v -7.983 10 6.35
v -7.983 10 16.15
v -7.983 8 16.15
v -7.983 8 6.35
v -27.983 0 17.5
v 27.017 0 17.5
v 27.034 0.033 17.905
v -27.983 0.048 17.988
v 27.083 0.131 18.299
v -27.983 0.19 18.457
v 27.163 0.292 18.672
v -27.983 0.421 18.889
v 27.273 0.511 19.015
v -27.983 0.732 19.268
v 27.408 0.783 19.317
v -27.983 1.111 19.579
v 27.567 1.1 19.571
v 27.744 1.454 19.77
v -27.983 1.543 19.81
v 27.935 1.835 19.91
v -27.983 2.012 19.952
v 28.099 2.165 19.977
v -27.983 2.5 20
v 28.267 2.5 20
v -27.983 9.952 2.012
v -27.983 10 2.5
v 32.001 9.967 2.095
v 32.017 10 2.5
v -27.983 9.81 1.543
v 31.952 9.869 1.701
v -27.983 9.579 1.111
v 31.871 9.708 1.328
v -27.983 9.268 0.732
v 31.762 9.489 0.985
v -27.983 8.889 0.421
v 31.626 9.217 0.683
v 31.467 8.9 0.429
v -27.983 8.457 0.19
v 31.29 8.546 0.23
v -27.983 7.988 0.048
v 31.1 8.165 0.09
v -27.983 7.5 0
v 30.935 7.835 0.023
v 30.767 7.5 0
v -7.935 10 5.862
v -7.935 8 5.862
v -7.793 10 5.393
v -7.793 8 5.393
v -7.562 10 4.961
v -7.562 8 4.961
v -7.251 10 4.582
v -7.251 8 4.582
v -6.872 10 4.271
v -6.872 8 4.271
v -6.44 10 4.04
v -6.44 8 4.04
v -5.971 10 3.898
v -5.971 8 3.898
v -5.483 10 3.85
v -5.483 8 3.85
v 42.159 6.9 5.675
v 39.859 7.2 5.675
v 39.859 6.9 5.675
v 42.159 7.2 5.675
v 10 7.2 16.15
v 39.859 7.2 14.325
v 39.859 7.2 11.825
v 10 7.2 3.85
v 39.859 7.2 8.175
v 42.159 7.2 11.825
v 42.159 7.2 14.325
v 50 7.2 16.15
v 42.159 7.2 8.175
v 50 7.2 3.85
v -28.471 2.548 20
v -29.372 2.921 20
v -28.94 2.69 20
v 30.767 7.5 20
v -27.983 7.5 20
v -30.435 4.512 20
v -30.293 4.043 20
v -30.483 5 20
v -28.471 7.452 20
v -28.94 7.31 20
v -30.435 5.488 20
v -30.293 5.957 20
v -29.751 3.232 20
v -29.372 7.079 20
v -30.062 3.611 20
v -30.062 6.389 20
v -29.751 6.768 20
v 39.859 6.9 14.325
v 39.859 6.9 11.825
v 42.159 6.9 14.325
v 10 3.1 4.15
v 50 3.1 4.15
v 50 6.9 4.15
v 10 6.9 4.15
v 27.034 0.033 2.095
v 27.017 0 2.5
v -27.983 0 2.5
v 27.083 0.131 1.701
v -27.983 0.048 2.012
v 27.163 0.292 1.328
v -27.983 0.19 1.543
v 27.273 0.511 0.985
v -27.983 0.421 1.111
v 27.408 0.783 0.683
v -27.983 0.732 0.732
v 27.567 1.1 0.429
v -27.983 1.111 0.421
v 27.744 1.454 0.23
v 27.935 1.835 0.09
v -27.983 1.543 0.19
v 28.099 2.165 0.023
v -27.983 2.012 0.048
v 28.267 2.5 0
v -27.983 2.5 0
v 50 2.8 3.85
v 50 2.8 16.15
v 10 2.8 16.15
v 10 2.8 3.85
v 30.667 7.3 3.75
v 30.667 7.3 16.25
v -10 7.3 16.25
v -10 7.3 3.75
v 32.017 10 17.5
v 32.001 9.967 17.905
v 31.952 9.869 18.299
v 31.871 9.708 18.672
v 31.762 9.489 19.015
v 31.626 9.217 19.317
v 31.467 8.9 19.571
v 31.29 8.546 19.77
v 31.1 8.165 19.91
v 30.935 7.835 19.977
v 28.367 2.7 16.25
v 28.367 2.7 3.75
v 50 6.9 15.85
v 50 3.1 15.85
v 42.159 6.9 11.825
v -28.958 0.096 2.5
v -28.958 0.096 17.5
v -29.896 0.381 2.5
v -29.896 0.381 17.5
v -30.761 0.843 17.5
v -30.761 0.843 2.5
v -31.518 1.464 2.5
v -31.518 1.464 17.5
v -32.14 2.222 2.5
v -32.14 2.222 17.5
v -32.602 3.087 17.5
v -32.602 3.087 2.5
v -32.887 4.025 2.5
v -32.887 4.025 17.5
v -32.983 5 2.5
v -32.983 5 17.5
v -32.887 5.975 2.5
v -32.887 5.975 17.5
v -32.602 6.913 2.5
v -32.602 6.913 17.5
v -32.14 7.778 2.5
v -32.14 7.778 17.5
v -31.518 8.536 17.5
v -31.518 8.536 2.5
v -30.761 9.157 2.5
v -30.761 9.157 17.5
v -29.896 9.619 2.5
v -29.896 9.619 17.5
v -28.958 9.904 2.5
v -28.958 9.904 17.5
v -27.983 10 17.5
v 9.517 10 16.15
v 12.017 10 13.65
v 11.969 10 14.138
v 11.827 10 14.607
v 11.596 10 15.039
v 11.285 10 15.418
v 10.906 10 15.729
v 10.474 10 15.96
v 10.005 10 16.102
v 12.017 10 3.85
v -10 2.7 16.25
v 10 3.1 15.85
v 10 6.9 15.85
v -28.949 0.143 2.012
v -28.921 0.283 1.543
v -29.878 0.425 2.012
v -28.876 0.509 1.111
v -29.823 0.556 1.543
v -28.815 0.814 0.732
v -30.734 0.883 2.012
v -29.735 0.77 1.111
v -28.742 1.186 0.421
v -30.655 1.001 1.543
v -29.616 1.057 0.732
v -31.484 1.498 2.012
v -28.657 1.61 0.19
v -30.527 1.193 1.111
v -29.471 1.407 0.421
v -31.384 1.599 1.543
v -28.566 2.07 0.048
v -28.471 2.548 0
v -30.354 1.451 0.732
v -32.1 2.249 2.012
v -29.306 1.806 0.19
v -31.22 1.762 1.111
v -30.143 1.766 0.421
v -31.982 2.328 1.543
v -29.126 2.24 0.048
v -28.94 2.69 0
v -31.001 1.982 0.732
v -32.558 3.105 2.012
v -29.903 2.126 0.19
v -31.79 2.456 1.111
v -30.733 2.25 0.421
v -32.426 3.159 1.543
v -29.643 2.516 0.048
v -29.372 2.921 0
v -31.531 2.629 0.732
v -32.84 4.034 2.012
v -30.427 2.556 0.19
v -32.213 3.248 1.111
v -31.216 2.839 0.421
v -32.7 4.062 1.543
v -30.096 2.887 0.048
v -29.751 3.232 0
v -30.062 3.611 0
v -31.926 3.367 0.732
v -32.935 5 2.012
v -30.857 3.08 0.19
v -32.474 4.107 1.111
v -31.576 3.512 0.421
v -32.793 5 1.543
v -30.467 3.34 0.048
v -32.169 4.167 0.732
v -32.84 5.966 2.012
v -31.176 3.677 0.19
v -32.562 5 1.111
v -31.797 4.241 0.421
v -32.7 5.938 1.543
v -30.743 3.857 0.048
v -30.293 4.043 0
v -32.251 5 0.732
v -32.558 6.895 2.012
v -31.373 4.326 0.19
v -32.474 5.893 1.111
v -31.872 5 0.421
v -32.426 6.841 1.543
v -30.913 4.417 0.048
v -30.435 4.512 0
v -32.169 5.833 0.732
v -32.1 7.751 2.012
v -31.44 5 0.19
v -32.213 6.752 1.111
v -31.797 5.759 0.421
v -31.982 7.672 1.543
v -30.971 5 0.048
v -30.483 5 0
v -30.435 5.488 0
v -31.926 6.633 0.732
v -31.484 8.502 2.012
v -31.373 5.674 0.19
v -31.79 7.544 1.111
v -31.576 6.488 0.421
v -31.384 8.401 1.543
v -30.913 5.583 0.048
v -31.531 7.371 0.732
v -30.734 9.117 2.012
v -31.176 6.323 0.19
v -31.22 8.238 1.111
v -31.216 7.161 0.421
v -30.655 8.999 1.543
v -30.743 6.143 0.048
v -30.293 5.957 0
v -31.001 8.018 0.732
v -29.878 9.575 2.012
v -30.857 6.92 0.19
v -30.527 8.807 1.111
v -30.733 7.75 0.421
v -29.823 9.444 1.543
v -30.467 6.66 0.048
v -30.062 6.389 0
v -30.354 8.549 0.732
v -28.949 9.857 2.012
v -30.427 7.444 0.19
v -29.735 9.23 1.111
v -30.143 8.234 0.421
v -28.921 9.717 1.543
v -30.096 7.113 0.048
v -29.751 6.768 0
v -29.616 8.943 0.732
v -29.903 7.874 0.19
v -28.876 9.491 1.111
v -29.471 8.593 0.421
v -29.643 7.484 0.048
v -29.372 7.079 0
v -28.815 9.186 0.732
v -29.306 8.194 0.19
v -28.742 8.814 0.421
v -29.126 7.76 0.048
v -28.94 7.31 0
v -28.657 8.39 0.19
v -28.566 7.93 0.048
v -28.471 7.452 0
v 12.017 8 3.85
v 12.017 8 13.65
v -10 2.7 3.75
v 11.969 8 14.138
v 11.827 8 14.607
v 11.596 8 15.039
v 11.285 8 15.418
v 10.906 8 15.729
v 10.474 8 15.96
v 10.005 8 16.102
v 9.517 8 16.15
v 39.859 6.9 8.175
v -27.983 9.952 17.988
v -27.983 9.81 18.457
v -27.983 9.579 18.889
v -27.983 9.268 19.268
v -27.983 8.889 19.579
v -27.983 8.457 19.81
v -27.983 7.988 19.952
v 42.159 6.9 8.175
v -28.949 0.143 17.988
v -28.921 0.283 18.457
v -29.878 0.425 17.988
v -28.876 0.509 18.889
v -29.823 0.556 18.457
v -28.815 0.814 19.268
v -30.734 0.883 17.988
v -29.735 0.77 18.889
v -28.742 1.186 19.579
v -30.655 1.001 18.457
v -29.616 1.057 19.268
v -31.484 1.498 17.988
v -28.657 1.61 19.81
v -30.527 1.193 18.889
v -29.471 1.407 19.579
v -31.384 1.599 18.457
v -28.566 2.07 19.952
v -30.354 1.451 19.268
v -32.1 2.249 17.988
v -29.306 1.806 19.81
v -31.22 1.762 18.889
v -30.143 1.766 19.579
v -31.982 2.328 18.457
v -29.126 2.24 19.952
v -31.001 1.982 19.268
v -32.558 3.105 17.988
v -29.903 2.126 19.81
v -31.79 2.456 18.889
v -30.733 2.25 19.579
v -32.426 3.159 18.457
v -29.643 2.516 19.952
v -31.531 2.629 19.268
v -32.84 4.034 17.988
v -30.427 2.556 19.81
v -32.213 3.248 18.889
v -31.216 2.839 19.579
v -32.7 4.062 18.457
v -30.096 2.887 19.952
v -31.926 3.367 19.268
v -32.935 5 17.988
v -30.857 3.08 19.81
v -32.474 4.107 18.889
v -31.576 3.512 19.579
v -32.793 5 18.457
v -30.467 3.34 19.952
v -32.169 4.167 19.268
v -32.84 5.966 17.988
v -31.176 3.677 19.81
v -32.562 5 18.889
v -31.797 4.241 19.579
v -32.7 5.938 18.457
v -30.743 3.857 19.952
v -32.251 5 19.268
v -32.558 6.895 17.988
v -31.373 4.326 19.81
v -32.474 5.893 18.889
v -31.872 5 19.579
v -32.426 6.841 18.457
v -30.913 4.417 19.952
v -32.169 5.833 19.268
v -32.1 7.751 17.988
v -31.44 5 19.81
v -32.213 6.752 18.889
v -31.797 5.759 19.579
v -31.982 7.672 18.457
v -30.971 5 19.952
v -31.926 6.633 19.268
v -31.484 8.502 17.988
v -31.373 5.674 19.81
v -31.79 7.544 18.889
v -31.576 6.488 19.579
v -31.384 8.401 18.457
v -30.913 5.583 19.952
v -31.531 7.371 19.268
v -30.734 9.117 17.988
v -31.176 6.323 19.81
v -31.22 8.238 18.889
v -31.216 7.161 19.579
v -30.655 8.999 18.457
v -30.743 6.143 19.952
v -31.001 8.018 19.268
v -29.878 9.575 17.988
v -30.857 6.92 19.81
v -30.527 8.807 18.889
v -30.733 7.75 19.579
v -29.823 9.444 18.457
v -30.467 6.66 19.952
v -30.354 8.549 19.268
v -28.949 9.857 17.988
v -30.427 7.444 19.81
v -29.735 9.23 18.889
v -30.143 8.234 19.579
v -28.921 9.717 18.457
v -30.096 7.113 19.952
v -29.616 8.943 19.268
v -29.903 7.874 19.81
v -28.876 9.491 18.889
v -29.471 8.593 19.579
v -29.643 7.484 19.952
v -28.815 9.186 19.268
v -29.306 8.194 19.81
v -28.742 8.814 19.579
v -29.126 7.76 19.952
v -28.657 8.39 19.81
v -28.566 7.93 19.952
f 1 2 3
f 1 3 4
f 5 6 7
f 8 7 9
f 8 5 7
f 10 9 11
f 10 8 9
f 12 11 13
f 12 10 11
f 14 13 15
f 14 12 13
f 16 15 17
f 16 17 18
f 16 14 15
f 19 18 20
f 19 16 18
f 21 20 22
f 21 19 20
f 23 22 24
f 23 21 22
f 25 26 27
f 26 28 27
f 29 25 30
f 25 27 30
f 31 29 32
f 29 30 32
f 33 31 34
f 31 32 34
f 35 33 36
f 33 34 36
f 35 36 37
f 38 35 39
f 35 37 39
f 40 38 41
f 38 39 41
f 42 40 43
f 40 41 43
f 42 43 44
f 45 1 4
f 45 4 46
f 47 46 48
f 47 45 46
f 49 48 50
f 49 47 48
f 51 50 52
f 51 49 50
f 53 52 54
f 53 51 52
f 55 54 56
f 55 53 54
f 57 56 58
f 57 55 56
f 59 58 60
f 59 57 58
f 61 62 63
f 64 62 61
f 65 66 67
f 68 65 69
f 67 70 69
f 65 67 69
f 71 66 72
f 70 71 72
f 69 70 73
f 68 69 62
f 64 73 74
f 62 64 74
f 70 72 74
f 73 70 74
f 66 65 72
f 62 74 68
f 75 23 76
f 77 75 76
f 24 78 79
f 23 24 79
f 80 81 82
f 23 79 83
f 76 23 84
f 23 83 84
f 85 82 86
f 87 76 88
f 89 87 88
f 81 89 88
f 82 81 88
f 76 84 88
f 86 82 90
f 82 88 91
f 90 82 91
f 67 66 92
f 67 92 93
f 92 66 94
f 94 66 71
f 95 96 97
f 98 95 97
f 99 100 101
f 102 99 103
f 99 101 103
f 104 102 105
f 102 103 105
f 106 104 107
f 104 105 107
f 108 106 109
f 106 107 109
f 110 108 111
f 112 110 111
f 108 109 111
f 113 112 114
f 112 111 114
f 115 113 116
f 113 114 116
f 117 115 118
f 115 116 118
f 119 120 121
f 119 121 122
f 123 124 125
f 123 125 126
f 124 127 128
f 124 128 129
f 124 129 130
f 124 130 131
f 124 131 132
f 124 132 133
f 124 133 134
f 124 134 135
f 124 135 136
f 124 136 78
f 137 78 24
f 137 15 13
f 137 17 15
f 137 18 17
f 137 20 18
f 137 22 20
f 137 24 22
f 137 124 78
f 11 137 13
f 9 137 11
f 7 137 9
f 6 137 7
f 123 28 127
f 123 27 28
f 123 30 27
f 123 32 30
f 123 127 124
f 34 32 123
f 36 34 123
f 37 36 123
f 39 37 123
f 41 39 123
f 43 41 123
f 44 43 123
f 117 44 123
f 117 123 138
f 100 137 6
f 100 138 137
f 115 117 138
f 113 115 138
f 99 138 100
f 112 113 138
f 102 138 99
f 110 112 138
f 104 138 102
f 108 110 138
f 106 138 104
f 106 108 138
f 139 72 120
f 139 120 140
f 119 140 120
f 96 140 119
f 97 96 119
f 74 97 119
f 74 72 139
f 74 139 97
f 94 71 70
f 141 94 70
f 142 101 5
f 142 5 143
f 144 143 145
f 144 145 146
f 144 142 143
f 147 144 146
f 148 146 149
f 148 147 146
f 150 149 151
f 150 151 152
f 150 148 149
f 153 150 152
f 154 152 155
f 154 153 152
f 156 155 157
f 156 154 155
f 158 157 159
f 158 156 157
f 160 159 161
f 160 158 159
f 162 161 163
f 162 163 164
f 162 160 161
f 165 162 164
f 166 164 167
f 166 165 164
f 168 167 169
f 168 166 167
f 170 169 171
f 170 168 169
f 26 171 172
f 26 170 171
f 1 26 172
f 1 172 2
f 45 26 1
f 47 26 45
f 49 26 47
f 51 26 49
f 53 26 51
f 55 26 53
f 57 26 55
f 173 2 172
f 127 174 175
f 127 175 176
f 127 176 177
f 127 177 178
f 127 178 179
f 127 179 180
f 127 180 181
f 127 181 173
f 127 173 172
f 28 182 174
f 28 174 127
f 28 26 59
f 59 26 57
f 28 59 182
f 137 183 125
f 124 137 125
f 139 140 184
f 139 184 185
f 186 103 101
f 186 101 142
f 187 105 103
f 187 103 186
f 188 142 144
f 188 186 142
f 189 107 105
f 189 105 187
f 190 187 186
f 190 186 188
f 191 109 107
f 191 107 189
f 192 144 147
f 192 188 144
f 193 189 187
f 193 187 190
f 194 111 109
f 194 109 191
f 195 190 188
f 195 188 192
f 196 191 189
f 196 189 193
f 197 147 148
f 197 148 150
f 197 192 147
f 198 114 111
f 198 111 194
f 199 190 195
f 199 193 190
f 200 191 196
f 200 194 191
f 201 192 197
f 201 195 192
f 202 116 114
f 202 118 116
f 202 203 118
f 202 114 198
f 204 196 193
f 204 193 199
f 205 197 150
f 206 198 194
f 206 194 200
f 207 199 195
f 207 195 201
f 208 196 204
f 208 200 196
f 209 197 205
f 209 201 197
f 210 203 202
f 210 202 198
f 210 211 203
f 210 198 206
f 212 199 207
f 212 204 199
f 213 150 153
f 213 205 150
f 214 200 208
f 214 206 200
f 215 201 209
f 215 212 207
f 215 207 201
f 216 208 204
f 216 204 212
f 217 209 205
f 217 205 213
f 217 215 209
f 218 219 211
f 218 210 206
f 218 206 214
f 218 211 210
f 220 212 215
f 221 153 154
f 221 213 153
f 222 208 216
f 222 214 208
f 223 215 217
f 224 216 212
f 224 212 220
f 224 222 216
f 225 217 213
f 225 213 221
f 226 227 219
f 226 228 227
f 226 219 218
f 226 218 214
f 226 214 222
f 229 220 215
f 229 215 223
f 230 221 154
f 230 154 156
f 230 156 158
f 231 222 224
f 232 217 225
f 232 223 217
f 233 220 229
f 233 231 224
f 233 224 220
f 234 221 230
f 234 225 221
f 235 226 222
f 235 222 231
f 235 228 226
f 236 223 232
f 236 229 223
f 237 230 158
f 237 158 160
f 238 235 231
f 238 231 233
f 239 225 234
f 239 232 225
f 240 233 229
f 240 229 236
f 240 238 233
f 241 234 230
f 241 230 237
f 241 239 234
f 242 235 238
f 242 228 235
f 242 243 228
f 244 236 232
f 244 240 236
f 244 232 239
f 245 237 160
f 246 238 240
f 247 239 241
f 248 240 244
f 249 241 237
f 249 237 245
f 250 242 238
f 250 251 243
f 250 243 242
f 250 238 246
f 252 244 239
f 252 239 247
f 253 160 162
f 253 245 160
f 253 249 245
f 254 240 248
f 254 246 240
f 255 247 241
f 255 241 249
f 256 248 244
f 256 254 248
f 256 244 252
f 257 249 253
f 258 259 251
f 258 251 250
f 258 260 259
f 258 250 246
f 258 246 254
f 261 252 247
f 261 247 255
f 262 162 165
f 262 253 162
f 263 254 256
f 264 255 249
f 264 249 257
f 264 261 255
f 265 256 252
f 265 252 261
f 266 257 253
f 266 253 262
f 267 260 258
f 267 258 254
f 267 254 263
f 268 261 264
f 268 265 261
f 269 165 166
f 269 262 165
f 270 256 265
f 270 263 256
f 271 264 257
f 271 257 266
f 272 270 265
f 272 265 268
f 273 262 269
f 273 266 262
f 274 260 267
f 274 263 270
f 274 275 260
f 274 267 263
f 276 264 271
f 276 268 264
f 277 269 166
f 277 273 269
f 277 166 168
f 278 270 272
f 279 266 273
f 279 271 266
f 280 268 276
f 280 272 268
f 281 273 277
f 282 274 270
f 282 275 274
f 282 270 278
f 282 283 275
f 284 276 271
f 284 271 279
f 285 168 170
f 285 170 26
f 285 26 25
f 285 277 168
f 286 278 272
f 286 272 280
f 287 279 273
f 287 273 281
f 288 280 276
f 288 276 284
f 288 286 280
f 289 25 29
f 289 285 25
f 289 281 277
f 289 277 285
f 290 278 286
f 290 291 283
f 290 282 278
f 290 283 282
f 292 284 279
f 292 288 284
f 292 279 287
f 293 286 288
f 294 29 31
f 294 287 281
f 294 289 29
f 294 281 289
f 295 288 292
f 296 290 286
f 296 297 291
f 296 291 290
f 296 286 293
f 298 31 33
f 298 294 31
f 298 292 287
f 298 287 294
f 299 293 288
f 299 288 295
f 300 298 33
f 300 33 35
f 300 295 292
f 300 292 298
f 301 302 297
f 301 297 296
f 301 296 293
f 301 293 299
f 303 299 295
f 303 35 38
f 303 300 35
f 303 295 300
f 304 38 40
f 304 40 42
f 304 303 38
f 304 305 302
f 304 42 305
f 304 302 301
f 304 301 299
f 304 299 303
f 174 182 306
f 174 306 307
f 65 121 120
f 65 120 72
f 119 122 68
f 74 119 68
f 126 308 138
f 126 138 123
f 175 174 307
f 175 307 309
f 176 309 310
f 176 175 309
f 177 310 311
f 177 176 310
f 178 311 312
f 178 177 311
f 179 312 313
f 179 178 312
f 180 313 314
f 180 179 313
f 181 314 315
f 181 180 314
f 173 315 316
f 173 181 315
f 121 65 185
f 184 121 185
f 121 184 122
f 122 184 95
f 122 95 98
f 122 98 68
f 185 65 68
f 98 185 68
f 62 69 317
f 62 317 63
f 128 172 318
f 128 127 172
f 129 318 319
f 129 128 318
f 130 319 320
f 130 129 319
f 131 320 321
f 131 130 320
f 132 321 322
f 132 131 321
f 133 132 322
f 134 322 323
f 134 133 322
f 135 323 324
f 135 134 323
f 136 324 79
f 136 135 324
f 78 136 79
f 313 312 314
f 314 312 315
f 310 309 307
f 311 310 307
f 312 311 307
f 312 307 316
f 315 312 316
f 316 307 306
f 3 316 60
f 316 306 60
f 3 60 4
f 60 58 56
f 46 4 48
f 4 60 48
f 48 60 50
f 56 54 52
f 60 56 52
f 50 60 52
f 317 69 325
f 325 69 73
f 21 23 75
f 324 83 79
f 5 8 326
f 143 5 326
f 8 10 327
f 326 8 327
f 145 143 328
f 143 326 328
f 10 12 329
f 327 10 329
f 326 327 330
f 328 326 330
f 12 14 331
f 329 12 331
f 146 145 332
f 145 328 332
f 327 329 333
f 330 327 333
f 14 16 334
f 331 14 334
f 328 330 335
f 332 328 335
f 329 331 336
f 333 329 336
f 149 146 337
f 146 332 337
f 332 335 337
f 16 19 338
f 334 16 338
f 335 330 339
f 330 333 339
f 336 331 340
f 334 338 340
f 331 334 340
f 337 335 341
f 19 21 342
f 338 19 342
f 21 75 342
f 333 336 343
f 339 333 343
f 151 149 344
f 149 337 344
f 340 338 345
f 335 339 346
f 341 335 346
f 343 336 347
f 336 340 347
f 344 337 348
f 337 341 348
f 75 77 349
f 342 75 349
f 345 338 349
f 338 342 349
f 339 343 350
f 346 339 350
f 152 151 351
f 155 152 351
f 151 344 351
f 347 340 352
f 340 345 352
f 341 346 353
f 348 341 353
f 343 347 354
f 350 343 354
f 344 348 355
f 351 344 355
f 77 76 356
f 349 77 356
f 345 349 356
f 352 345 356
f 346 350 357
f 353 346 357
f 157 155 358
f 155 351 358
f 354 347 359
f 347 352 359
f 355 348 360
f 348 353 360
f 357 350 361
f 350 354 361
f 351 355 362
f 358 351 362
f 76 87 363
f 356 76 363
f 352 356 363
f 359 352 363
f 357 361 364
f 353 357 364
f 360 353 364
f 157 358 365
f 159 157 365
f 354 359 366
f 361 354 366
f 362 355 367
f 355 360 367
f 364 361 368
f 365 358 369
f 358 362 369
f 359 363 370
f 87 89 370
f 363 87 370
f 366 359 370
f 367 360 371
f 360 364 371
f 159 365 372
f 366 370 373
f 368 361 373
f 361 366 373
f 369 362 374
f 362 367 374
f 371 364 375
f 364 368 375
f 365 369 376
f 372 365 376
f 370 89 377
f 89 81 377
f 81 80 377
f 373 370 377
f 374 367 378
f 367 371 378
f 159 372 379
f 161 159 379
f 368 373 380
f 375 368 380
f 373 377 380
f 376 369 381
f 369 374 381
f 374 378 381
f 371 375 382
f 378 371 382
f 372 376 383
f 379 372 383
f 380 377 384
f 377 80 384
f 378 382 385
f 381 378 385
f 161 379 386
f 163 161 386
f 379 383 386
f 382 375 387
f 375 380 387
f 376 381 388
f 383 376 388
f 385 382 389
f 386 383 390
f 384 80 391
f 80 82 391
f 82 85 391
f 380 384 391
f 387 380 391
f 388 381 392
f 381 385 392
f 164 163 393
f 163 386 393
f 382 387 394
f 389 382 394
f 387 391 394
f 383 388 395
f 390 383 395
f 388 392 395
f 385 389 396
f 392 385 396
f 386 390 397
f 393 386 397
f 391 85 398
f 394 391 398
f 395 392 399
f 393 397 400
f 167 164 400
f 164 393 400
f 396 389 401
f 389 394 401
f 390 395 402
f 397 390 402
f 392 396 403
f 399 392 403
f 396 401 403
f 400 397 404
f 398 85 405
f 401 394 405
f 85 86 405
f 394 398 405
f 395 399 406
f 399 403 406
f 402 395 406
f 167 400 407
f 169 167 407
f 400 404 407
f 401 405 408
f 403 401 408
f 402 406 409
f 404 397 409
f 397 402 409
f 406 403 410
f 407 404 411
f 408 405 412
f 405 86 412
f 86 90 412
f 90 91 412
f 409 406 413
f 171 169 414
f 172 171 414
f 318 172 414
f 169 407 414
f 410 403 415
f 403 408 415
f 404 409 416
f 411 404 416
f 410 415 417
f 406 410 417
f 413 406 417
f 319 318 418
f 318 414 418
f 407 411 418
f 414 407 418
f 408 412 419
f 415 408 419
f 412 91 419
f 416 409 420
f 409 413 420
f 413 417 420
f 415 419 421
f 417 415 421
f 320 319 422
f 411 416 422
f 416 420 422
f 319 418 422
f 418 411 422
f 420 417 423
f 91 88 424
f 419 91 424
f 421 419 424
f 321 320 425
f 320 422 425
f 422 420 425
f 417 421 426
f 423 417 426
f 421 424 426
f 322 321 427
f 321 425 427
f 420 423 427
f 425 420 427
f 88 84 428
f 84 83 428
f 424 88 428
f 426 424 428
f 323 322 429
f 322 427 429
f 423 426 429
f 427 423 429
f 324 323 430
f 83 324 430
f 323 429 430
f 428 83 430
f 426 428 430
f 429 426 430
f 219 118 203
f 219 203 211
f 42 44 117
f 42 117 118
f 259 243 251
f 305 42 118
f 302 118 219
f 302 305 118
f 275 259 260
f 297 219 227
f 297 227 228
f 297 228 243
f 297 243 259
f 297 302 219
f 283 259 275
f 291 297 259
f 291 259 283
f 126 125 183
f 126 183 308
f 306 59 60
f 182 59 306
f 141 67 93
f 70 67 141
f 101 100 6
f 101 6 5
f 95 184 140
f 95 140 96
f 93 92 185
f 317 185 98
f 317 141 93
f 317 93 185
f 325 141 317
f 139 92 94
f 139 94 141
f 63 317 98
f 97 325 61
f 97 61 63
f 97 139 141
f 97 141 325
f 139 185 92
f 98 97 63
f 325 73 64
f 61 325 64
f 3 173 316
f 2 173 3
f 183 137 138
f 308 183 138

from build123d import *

# Parameters (mm, degrees)
BOSS_EXTRUDE1_DEPTH = 20
SKETCH2_W           = 12.5
SKETCH2_H           = 4.6
CUT_EXTRUDE1_DEPTH  = 60
SKETCH4_W           = 12.3
SKETCH4_H           = 4.4
SKETCH4_W_2         = 11.7
SKETCH4_H_2         = 3.8
BOSS_EXTRUDE3_DEPTH = 40
SKETCH6_W           = 2.3
SKETCH6_H           = 2.5
CUT_EXTRUDE8_DEPTH  = 0.3
CUT_EXTRUDE10_DEPTH = 2
FILLET1_R           = 2.5
FILLET2_R           = 2.5


with BuildPart() as part:
    # Sketch1 → Boss-Extrude1 (new body)
    with BuildSketch(Plane.XY):
        with BuildLine():
            Line((-27.982882883, 10), (32.017117117, 10))
            Line((32.017117117, 10), (27.017117117, 0))
            Line((27.017117117, 0), (-27.982882883, 0))
            ThreePointArc((-27.982882883, 0), (-32.982882883, 5), (-27.982882883, 10))
        make_face()
    extrude(amount=BOSS_EXTRUDE1_DEPTH)

    # Sketch2 → Cut-Extrude1 (cut)
    with BuildSketch(Plane(origin=(50, 0, 0), x_dir=(0, 0, -1), z_dir=(1, 0, 0))):
        with Locations((-10, 5)):
            Rectangle(SKETCH2_W, SKETCH2_H)
    extrude(amount=-CUT_EXTRUDE1_DEPTH, mode=Mode.SUBTRACT)

    # Sketch7 → Cut-Extrude10 (cut)
    with BuildSketch(Plane(origin=(0, 10, 0), x_dir=(1, 0, 0), z_dir=(0, 1, 0))):
        with BuildLine():
            Line((-5.482882883, -3.85), (12.017117117, -3.85))
            Line((12.017117117, -3.85), (12.017117117, -13.65))
            ThreePointArc((12.017117117, -13.65), (11.28488407, -15.417766953), (9.517117117, -16.15))
            Line((9.517117117, -16.15), (-7.982882883, -16.15))
            Line((-7.982882883, -16.15), (-7.982882883, -6.35))
            ThreePointArc((-7.982882883, -6.35), (-7.250649836, -4.582233047), (-5.482882883, -3.85))
        make_face()
    extrude(amount=-CUT_EXTRUDE10_DEPTH, mode=Mode.SUBTRACT)

    # Fillet1
    fillet1_edges = [part.edges().sort_by_distance(p)[0] for p in [
        (2.017117117, 10, 20),
        (-32.982882883, 5, 20),
        (-0.482882883, 0, 20),
    ]]
    fillet(fillet1_edges, radius=FILLET1_R)

    # Fillet2
    fillet2_edges = [part.edges().sort_by_distance(p)[0] for p in [
        (2.017117117, 10, 0),
        (-0.482882883, 0, 0),
        (-32.982882883, 5, 0),
    ]]
    fillet(fillet2_edges, radius=FILLET2_R)


with BuildPart() as body_2:
    # Sketch4 → Boss-Extrude3 (new body)
    with BuildSketch(Plane(origin=(50, 0, 0), x_dir=(0, 0, -1), z_dir=(1, 0, 0))):
        with Locations((-10, 5)):
            Rectangle(SKETCH4_W, SKETCH4_H)
        with Locations((-10, 5)):
            Rectangle(SKETCH4_W_2, SKETCH4_H_2, mode=Mode.SUBTRACT)
    extrude(amount=-BOSS_EXTRUDE3_DEPTH)

    # Sketch6 → Cut-Extrude8 (cut)
    with BuildSketch(Plane(origin=(0, 7.2, 0), x_dir=(1, 0, 0), z_dir=(0, 1, 0))):
        with Locations((41.008558559, -6.925)):
            Rectangle(SKETCH6_W, SKETCH6_H)
        with Locations((41.008558559, -13.075)):
            Rectangle(SKETCH6_W, SKETCH6_H)
    extrude(amount=-CUT_EXTRUDE8_DEPTH, mode=Mode.SUBTRACT)


solid = Compound([part.part, body_2.part])
